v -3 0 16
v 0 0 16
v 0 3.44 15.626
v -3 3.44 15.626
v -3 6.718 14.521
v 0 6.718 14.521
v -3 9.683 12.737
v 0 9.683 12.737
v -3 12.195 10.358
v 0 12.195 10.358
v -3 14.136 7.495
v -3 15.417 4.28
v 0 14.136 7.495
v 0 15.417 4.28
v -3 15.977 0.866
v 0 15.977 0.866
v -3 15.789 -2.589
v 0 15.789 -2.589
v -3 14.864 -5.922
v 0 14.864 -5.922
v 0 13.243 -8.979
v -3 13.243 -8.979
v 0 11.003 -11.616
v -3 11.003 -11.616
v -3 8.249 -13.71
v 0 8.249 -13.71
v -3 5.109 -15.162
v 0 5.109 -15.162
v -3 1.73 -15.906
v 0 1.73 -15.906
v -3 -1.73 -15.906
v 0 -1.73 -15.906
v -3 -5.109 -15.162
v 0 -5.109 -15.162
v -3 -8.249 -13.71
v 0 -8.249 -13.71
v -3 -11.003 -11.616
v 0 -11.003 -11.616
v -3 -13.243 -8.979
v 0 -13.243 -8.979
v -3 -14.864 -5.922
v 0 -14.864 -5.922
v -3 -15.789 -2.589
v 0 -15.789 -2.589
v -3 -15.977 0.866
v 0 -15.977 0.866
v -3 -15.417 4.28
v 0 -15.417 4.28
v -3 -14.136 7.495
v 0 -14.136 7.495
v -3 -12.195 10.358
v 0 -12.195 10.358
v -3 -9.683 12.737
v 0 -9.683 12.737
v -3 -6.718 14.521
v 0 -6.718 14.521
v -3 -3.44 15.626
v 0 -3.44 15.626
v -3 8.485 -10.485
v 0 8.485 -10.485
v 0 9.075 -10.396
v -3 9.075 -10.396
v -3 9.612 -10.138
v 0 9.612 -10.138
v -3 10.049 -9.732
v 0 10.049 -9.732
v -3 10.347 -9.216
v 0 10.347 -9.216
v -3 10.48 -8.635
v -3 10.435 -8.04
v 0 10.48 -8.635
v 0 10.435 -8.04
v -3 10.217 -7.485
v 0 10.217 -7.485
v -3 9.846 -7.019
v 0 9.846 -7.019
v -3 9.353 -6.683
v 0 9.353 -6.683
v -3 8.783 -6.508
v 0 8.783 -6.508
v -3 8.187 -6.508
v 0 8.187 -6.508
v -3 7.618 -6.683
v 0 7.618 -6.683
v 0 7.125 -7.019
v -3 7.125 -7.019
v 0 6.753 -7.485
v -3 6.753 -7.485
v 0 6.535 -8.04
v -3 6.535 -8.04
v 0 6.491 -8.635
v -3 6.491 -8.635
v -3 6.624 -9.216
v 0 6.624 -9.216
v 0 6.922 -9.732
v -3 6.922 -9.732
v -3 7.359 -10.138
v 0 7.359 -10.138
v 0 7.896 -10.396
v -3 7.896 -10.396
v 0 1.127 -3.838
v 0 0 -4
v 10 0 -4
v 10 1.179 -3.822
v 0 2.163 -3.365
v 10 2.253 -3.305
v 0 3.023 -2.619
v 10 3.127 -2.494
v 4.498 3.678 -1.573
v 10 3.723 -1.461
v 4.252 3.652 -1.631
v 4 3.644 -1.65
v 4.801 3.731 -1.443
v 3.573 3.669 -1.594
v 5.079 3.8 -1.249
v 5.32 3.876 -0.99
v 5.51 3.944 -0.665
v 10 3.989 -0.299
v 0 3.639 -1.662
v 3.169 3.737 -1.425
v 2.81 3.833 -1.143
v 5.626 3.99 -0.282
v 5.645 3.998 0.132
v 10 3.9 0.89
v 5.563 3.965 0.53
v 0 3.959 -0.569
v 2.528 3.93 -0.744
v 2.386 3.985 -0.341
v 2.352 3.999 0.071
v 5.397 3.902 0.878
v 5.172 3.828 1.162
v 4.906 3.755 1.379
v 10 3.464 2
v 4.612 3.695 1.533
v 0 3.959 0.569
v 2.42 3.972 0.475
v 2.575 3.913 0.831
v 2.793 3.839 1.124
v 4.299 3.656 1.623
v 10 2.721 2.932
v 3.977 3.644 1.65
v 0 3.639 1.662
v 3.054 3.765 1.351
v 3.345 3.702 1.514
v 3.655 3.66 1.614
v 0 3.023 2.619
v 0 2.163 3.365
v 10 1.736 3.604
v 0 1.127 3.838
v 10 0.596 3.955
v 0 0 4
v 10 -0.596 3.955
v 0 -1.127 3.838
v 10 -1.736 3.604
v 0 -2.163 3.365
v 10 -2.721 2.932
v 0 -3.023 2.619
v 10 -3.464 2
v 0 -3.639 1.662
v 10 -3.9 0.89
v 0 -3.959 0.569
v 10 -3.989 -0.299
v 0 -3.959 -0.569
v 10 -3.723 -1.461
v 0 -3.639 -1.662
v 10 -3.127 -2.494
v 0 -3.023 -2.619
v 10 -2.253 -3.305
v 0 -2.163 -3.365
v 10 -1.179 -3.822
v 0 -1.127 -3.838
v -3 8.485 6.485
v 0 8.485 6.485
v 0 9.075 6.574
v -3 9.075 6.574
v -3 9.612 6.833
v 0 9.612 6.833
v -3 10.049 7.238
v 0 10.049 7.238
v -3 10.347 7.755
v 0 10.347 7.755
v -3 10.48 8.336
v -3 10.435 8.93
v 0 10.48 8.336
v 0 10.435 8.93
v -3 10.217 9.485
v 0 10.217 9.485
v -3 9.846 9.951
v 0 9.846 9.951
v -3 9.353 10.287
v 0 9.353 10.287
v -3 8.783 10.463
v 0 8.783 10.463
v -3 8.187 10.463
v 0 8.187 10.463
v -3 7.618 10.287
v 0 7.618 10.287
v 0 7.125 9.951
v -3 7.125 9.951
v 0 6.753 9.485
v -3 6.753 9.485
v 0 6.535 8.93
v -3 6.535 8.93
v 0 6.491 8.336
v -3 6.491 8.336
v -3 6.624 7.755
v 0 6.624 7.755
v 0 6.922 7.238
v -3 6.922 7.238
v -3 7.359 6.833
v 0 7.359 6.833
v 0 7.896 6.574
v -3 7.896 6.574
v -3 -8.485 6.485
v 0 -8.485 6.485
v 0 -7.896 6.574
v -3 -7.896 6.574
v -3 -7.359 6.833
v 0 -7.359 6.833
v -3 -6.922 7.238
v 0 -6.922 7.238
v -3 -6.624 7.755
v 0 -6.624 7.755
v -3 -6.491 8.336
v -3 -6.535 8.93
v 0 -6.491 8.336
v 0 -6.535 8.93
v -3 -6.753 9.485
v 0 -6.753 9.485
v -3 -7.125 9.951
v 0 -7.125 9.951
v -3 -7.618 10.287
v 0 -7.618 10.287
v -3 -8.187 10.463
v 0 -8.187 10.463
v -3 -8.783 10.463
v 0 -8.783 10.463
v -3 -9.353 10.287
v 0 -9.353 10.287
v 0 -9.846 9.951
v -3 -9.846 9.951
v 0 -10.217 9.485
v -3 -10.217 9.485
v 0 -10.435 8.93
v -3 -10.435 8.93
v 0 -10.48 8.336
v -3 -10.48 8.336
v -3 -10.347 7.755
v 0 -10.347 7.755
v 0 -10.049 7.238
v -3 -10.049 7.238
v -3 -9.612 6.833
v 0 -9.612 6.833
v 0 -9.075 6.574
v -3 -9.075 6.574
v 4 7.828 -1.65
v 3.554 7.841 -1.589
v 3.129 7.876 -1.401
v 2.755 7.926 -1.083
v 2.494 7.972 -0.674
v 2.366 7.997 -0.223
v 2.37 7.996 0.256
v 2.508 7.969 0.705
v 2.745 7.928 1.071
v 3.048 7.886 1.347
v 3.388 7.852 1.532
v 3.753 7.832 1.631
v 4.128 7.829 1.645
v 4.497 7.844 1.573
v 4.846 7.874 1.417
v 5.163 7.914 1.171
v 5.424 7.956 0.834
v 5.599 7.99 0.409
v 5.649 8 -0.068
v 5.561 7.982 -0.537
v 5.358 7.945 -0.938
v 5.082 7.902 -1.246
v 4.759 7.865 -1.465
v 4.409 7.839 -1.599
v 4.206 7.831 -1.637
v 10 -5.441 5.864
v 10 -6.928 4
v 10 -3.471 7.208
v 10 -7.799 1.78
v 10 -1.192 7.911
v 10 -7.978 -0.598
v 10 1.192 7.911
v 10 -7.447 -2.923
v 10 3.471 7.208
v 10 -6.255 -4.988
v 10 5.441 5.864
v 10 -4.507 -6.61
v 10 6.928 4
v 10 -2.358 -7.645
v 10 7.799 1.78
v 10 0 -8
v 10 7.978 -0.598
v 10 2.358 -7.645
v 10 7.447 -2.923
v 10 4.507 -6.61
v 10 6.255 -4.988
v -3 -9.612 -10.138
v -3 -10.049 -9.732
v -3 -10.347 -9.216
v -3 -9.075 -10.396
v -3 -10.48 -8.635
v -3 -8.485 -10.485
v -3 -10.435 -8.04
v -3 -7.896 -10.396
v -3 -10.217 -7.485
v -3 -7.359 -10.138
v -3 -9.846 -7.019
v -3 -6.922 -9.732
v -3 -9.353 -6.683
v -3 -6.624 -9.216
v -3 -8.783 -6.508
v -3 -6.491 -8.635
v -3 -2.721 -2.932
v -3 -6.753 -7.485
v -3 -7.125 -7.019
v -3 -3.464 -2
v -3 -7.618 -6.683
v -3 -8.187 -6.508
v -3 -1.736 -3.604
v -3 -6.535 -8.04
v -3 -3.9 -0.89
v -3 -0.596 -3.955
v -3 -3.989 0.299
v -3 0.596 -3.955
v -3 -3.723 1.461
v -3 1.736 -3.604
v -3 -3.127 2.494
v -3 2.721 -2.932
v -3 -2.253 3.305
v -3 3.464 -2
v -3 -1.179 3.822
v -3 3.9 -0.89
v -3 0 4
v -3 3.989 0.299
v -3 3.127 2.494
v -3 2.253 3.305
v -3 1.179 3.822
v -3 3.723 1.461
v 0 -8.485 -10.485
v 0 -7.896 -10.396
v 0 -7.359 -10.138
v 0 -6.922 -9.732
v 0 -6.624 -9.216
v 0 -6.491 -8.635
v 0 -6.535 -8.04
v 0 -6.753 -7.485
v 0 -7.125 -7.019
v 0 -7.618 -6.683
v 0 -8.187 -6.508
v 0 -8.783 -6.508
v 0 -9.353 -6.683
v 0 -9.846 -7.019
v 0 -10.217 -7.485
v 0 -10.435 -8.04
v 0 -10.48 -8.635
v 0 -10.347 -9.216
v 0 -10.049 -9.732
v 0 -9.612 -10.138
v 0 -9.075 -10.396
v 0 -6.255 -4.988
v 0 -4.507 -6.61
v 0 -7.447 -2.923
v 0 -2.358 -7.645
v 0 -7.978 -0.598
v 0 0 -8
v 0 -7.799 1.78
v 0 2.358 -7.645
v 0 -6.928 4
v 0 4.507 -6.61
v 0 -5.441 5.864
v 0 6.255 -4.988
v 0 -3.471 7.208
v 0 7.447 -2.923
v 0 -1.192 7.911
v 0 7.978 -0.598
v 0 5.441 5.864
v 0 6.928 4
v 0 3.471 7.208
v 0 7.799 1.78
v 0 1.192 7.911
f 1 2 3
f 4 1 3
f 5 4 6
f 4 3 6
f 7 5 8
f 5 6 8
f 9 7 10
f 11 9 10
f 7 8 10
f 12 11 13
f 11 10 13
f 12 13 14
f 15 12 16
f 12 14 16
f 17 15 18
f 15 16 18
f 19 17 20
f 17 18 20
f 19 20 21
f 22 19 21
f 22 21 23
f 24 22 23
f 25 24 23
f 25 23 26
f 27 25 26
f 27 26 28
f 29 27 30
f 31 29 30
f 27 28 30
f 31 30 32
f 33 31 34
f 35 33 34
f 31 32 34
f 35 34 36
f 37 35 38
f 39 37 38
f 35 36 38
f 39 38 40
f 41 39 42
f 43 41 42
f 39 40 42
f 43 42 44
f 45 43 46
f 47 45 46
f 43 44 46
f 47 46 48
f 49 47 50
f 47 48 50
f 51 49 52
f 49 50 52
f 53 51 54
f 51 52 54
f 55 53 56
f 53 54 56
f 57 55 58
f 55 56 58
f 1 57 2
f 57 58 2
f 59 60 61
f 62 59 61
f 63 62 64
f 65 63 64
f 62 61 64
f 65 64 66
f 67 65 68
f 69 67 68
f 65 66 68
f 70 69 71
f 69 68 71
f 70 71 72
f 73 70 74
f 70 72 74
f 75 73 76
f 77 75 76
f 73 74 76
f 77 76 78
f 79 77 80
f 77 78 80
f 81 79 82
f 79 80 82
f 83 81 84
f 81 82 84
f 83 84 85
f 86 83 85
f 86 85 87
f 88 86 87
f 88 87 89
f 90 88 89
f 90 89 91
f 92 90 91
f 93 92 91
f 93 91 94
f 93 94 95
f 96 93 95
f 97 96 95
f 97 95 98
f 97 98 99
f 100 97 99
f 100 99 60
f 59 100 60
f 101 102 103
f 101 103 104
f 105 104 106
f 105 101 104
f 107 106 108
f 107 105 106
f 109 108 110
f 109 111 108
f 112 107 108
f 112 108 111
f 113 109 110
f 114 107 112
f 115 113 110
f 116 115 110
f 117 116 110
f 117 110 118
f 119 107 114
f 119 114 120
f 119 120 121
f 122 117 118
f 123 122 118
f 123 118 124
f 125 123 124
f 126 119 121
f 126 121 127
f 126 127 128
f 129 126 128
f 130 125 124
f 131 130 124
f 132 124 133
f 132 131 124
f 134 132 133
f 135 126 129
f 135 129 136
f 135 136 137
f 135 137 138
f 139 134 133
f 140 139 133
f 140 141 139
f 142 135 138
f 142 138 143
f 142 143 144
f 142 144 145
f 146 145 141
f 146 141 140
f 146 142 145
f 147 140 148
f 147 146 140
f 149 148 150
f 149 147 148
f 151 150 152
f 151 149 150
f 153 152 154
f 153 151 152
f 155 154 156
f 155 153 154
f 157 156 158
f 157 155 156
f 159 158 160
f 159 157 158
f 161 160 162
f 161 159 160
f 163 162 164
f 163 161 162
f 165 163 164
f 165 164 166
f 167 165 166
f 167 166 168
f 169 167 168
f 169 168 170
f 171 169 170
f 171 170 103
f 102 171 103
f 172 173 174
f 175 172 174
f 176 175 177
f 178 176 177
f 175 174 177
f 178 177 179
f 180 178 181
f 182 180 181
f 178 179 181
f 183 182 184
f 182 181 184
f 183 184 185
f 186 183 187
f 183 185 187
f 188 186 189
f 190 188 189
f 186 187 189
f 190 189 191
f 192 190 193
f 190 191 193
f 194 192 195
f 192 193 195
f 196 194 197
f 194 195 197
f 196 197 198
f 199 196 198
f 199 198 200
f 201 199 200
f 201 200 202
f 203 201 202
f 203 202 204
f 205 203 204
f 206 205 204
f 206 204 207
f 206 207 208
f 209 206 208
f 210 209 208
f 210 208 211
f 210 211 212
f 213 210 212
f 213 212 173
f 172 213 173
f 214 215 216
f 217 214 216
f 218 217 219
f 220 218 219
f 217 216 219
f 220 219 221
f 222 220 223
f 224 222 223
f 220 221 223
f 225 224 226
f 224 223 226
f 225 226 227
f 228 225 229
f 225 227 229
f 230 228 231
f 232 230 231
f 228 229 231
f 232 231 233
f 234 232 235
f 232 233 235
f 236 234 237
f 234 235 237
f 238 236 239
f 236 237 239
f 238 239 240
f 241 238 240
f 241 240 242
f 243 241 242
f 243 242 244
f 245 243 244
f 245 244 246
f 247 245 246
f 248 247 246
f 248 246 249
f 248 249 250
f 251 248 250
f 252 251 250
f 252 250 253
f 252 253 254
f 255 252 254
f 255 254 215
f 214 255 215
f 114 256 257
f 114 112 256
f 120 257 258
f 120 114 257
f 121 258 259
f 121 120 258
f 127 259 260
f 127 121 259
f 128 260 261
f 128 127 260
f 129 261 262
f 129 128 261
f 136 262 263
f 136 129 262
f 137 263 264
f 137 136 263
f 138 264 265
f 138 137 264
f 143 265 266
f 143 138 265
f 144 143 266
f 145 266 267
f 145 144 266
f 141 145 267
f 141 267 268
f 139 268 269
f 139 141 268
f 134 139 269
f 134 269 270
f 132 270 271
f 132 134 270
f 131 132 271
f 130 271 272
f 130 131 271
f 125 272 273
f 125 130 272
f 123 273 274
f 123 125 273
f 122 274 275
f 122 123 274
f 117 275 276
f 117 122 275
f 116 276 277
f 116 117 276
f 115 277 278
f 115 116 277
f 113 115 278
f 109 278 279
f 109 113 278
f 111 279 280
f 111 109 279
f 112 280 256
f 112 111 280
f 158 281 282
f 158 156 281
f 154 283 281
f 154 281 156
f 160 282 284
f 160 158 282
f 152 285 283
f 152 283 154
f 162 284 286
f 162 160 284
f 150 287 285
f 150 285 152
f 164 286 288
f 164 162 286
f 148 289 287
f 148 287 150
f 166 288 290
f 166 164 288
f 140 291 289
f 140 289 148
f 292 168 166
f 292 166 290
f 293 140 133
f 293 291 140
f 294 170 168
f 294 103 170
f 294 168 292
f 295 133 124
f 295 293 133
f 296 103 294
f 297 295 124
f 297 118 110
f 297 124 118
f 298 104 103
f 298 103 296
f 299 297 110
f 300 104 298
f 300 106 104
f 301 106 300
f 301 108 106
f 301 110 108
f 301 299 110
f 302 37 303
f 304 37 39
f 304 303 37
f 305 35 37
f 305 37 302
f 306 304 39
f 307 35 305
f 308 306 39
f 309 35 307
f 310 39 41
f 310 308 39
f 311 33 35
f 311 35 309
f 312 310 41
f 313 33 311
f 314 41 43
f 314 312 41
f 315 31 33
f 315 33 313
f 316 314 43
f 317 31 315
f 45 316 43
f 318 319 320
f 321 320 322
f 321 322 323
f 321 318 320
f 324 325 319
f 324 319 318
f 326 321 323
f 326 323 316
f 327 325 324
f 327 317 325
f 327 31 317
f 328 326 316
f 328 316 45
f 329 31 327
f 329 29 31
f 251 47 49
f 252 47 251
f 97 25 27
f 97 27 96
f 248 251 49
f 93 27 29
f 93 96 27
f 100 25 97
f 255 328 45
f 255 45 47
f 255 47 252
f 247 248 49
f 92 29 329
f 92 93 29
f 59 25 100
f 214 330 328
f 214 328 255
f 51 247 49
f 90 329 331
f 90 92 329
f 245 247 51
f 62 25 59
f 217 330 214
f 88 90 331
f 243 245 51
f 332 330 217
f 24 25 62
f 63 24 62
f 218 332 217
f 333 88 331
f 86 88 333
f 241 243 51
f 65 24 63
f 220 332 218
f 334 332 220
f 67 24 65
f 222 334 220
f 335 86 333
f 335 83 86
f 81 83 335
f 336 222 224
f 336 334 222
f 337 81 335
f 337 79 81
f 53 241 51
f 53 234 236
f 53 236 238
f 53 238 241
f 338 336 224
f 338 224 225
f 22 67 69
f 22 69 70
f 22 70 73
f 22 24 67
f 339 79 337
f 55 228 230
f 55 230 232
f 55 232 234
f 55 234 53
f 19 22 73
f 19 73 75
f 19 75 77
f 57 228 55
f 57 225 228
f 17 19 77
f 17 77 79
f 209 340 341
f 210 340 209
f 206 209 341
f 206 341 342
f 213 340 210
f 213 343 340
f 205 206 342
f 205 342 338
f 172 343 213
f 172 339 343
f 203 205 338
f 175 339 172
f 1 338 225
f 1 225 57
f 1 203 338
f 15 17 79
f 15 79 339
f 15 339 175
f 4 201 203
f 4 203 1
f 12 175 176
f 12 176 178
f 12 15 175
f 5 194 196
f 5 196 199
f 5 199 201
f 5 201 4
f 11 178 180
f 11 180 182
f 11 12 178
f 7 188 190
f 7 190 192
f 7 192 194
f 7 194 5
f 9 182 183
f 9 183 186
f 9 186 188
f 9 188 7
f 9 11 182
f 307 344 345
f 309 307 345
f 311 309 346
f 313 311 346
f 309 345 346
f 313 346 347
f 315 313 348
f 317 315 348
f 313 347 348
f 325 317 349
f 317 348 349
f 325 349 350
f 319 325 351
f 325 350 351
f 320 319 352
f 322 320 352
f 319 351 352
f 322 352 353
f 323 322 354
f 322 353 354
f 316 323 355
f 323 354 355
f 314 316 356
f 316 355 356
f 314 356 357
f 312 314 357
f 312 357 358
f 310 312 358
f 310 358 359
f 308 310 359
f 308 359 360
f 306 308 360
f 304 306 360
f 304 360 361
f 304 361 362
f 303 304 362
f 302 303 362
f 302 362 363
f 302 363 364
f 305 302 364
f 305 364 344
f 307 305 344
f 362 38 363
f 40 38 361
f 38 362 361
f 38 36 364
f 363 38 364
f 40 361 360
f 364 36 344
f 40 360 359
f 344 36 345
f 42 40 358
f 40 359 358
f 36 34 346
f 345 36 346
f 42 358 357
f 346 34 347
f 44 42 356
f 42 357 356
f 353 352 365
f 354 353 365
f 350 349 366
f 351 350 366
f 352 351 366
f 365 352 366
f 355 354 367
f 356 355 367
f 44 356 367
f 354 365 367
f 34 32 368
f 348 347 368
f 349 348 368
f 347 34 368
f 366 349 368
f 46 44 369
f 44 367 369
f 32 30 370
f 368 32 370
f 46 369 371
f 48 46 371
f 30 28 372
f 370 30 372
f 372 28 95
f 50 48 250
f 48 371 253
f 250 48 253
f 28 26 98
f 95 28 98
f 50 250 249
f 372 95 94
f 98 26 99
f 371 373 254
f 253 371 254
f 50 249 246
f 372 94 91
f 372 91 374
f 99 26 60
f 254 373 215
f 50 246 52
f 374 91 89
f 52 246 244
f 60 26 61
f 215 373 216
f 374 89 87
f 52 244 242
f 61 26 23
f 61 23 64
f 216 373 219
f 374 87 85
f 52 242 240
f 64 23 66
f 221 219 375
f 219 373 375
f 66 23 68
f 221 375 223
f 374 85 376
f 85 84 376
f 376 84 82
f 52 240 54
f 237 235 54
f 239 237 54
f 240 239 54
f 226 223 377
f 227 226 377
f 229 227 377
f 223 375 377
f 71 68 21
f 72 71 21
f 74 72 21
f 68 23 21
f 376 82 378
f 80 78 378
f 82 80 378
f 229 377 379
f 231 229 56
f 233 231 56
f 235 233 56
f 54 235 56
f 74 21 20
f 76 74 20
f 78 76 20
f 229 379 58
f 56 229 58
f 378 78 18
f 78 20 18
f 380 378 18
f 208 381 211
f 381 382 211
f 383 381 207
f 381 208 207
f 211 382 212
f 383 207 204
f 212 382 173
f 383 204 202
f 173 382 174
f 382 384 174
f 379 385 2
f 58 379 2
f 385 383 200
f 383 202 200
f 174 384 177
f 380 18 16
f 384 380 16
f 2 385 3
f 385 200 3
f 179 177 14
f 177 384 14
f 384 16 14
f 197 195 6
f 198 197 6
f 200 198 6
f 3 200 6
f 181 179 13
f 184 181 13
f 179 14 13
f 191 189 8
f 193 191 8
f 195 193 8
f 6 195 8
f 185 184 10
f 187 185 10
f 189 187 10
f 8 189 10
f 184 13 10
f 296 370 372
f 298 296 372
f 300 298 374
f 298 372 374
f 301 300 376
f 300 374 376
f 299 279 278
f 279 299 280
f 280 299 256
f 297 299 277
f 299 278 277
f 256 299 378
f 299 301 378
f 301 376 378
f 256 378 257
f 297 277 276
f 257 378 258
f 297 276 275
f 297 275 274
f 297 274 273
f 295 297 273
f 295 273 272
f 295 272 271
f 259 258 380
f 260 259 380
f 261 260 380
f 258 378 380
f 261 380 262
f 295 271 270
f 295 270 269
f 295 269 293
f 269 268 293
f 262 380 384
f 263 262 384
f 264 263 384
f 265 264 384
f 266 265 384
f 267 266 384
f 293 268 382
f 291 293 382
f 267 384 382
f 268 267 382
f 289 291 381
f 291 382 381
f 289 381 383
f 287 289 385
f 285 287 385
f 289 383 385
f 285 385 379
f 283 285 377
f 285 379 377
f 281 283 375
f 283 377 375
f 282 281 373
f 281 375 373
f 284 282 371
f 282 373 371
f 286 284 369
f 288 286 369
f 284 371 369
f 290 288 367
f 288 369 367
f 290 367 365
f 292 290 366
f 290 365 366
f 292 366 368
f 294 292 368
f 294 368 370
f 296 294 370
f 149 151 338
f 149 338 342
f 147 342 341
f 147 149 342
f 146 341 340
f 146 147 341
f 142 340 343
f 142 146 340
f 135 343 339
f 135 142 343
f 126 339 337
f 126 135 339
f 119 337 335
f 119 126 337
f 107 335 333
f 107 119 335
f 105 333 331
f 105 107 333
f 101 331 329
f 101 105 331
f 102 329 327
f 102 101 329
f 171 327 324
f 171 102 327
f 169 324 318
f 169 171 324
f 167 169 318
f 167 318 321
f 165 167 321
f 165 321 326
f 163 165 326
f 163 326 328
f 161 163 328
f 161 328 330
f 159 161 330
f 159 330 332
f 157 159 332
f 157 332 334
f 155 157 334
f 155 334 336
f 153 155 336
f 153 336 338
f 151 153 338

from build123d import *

# Parameters (mm, degrees)
SKETCH_1_R          = 8
SKETCH_1_R_2        = 4
EXTRUDE_1_DEPTH     = 10
SKETCH_2_R          = 16
SKETCH_2_R_2        = 4
EXTRUDE_2_DEPTH     = 3
CUT_EXTRUDE_1_REACH = 5
SKETCH_3_R          = 2


with BuildPart() as part:
    # 草图1 → 凸台-拉伸1 (new body)
    with BuildSketch(Plane(origin=(0, 0, 0), x_dir=(0, 0, -1), z_dir=(1, 0, 0))):
        Circle(SKETCH_1_R)
        Circle(SKETCH_1_R_2, mode=Mode.SUBTRACT)
    extrude(amount=EXTRUDE_1_DEPTH)

    # 草图2 → 凸台-拉伸2 (add)
    with BuildSketch(Plane.ZY):
        Circle(SKETCH_2_R)
        Circle(SKETCH_2_R_2, mode=Mode.SUBTRACT)
    extrude(amount=EXTRUDE_2_DEPTH)

    # 草图3 → 切除-拉伸1 (cut, up to next)
    with BuildSketch(Plane(origin=(0, 0, 0), x_dir=(0, 0, -1), z_dir=(1, 0, 0)), mode=Mode.PRIVATE) as cut_extrude_1_sk1:
        with Locations((-8.485281374, -8.485281374)):
            Circle(SKETCH_3_R)
    cut_extrude_1_tool1 = extrude(cut_extrude_1_sk1.sketch, amount=-CUT_EXTRUDE_1_REACH, mode=Mode.PRIVATE) & part.part
    add(cut_extrude_1_tool1.solids().sort_by_distance((0, -8.485281, 8.485281))[0], mode=Mode.SUBTRACT)
    # 草图3 → 切除-拉伸1 (cut, up to next)
    with BuildSketch(Plane(origin=(0, 0, 0), x_dir=(0, 0, -1), z_dir=(1, 0, 0)), mode=Mode.PRIVATE) as cut_extrude_1_sk2:
        with Locations((8.485281374, 8.485281374)):
            Circle(SKETCH_3_R)
    cut_extrude_1_tool2 = extrude(cut_extrude_1_sk2.sketch, amount=-CUT_EXTRUDE_1_REACH, mode=Mode.PRIVATE) & part.part
    add(cut_extrude_1_tool2.solids().sort_by_distance((0, 8.485281, -8.485281))[0], mode=Mode.SUBTRACT)
    # 草图3 → 切除-拉伸1 (cut, up to next)
    with BuildSketch(Plane(origin=(0, 0, 0), x_dir=(0, 0, -1), z_dir=(1, 0, 0)), mode=Mode.PRIVATE) as cut_extrude_1_sk3:
        with Locations((-8.485281374, 8.485281374)):
            Circle(SKETCH_3_R)
    cut_extrude_1_tool3 = extrude(cut_extrude_1_sk3.sketch, amount=-CUT_EXTRUDE_1_REACH, mode=Mode.PRIVATE) & part.part
    add(cut_extrude_1_tool3.solids().sort_by_distance((0, 8.485281, 8.485281))[0], mode=Mode.SUBTRACT)
    # 草图3 → 切除-拉伸1 (cut, up to next)
    with BuildSketch(Plane(origin=(0, 0, 0), x_dir=(0, 0, -1), z_dir=(1, 0, 0)), mode=Mode.PRIVATE) as cut_extrude_1_sk4:
        with Locations((8.485281374, -8.485281374)):
            Circle(SKETCH_3_R)
    cut_extrude_1_tool4 = extrude(cut_extrude_1_sk4.sketch, amount=-CUT_EXTRUDE_1_REACH, mode=Mode.PRIVATE) & part.part
    add(cut_extrude_1_tool4.solids().sort_by_distance((0, -8.485281, -8.485281))[0], mode=Mode.SUBTRACT)

    # 草图5 → M4 螺纹孔1 (revolve, cut)
    with BuildSketch(Plane(origin=(4.000350767, 0, 0), x_dir=(0, 0, -1), z_dir=(1, 0, 0))):
        Polygon((0, 0), (0, 12.491420021), (1.65, 11.5), (1.65, 0), align=None)
    revolve(axis=Axis((4.000350767, -6.35, 0), (0, 1, 0)), mode=Mode.SUBTRACT)


solid = part.part
